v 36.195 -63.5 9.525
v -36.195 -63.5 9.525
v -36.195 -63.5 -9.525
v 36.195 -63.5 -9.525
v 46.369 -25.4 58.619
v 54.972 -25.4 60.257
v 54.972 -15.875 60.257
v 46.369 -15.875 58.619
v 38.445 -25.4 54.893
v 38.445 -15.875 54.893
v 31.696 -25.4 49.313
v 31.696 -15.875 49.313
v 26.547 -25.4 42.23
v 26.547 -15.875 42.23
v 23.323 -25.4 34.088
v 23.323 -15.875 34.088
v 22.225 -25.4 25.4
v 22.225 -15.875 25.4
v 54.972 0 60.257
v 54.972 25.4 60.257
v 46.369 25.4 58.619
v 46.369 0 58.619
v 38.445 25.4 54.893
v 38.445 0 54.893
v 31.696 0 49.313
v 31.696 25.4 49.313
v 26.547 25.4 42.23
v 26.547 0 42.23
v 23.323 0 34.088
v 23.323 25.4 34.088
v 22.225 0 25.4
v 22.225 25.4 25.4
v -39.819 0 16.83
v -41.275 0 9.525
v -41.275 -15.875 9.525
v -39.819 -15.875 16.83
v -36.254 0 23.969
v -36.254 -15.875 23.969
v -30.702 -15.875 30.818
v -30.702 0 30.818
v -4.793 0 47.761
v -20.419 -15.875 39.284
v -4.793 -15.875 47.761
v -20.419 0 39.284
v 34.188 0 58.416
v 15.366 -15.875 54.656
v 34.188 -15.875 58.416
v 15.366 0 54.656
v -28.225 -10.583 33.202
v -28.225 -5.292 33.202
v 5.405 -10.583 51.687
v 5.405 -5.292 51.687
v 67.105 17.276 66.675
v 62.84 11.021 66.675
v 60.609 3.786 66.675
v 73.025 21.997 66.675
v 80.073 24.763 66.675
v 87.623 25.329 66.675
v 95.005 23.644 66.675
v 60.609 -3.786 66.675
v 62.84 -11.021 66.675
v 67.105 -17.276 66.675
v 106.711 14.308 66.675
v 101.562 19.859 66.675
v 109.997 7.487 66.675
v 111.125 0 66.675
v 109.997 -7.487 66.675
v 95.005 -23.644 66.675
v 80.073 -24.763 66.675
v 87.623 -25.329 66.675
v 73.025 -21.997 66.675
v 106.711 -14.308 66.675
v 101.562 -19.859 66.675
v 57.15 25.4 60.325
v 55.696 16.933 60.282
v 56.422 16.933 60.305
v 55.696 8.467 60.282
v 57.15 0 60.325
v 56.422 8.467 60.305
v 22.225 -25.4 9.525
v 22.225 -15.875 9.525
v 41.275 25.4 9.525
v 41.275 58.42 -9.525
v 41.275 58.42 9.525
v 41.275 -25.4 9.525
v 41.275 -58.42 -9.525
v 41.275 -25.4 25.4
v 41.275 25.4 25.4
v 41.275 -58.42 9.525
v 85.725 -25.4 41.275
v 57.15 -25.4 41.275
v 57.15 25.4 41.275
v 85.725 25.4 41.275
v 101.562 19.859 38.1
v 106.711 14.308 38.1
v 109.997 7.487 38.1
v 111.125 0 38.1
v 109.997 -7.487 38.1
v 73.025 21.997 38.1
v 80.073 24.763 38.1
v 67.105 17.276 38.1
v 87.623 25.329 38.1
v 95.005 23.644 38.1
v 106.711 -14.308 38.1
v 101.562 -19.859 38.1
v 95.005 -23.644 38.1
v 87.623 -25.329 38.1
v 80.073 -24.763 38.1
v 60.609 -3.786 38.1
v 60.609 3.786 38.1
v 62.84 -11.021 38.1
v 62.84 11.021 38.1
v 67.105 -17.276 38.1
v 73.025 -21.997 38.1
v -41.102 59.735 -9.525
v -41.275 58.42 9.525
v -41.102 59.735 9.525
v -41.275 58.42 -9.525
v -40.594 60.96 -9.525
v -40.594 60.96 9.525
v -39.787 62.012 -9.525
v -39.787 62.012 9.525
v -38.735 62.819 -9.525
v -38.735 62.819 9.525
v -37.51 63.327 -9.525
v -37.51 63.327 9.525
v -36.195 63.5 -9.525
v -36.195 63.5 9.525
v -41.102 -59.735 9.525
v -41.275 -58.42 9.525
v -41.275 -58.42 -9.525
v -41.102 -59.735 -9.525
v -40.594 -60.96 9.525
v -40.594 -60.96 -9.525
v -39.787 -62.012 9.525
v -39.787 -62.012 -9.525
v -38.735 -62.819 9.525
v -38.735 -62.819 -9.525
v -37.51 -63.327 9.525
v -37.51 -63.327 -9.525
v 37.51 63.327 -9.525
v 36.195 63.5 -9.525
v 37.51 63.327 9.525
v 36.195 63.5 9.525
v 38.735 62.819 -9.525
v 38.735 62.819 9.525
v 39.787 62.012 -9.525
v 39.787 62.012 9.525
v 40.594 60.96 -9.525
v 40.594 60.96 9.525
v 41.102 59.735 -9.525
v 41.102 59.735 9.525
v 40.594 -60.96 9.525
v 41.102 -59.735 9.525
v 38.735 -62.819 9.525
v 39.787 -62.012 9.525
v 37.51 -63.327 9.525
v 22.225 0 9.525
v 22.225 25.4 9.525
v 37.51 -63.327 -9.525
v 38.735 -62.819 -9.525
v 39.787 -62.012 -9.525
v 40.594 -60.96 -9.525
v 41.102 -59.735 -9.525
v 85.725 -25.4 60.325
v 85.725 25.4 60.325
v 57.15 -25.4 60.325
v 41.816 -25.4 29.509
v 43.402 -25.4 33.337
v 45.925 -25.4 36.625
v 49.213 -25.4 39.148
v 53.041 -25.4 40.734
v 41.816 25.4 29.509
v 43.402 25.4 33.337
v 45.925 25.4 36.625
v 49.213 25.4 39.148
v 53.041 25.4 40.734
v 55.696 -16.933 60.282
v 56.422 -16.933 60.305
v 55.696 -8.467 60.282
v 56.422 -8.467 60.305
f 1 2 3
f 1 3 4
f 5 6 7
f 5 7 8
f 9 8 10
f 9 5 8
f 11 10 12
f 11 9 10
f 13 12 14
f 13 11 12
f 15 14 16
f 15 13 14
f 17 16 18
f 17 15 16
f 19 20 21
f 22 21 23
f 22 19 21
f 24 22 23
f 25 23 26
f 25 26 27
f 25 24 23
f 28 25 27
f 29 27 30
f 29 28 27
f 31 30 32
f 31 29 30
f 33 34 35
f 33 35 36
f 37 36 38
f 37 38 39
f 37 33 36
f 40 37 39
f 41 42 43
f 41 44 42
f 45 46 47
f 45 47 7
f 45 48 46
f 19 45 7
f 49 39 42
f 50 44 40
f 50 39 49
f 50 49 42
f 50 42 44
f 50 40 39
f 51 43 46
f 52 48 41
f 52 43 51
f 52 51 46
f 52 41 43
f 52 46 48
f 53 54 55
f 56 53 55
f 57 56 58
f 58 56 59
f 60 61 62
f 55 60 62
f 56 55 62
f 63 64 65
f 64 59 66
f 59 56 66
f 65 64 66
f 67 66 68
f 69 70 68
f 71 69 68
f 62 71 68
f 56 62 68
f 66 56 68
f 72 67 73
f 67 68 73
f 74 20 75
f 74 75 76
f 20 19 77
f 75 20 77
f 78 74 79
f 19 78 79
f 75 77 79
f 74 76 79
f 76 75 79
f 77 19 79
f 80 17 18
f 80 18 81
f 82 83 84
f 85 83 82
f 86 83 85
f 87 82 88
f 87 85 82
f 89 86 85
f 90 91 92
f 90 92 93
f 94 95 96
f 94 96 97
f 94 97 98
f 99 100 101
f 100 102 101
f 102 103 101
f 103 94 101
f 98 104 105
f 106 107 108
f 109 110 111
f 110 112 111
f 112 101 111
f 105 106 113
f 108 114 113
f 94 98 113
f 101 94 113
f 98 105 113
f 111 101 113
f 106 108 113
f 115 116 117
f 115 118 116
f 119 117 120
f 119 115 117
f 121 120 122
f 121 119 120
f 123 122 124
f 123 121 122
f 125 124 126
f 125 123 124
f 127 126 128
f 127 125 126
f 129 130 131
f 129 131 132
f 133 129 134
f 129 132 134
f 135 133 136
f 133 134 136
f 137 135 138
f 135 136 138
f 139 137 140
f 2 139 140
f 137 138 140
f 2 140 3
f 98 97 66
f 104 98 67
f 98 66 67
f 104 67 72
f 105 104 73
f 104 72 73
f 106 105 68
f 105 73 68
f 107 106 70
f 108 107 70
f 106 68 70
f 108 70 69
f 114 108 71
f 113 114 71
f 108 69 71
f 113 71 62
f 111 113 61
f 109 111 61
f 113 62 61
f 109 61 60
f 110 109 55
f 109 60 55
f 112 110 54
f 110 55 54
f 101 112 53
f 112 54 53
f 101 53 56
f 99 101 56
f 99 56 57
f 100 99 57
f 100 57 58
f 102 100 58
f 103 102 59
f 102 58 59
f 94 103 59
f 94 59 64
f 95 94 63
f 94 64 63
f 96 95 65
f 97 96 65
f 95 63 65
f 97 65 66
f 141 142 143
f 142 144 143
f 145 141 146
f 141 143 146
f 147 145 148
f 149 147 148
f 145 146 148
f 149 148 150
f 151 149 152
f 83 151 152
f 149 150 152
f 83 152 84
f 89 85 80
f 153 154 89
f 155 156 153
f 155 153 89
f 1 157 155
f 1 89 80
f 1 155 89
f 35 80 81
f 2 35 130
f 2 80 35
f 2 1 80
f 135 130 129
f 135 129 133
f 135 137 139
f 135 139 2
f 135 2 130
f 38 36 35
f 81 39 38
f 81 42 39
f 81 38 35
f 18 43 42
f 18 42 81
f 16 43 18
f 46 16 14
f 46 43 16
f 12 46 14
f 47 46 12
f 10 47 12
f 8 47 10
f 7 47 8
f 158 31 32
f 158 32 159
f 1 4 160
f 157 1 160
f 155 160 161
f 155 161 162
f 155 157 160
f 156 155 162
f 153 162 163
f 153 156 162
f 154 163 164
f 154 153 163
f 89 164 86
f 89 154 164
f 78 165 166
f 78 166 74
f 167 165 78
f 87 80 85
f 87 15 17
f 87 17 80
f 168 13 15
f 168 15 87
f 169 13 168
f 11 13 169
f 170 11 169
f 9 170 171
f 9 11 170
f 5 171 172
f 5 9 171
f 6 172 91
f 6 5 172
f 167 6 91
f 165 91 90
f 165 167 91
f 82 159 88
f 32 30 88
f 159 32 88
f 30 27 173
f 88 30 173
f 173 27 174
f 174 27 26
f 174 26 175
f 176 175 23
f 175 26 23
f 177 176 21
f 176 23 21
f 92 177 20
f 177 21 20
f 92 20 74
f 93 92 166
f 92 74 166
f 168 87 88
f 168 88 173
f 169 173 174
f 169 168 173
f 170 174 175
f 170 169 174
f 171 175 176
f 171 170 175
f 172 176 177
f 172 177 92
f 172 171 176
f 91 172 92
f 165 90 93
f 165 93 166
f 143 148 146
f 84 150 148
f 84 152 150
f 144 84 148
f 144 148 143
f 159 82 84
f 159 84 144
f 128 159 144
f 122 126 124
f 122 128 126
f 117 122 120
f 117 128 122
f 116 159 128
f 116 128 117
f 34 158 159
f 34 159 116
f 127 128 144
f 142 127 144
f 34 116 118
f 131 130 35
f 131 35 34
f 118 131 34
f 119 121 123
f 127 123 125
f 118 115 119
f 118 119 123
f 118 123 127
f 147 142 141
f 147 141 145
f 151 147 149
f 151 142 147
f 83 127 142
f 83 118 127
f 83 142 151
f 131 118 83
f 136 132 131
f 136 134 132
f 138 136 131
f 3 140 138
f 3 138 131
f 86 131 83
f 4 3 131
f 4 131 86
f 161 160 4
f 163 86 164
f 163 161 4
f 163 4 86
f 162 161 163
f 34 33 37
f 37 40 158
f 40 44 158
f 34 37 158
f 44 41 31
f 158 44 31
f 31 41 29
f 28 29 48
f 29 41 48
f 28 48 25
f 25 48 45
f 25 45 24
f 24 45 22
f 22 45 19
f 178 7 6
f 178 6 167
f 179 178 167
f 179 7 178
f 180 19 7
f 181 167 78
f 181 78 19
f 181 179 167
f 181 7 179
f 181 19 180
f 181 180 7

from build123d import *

# Parameters (mm, degrees)
F1_DEPTH = 63.5
F0_W     = 25.4
F0_H     = 19.05
F2_DEPTH = 25.4
F3_DEPTH = 15.875
F5_R     = 5.08


with BuildPart() as f1:
    # F0 (on Front) → F1 (new body, symmetric)
    with BuildSketch(Plane.XZ):
        Polygon((41.275, -9.525), (41.275, 9.525), (22.225, 9.525), (-41.275, 9.525), (-41.275, -9.525), align=None)
    extrude(amount=F1_DEPTH, both=True)

    # F0 (on Front) → F2 (join, symmetric)
    with BuildSketch(Plane.XZ):
        with BuildLine():
            Line((22.225, 9.525), (41.275, 9.525))
            Line((41.275, 9.525), (41.275, 25.4))
            ThreePointArc((41.275, 25.4), (45.9246798487, 36.6253201513), (57.15, 41.275))
            Line((57.15, 41.275), (60.325, 41.275))
            Line((60.325, 41.275), (60.325, 60.325))
            Line((60.325, 60.325), (57.15, 60.325))
            add(Edge.make_bspline(
                [(54.9717725402, 60.2570071884), (55.6950364998, 60.2833505929), (56.4211273371, 60.3060301334), (57.15, 60.325)],
                knots=[109.3489314382, 109.3489314382, 109.3489314382, 109.3489314382, 110.761548495, 110.761548495, 110.761548495, 110.761548495], degree=3))
            ThreePointArc((54.9717725402, 60.2570071884), (31.6958233385, 49.3131870624), (22.225, 25.4))
            Line((22.225, 25.4), (22.225, 9.525))
        make_face()
        with Locations((73.025, 50.8)):
            Rectangle(F0_W, F0_H)
    extrude(amount=F2_DEPTH, both=True)

    # F0 (on Front) → F3 (join)
    with BuildSketch(Plane.XZ):
        with BuildLine():
            Line((-41.275, 9.525), (22.225, 9.525))
            Line((22.225, 9.525), (22.225, 25.4))
            ThreePointArc((22.225, 25.4), (31.6958233385, 49.3131870624), (54.9717725402, 60.2570071884))
            add(Edge.make_bspline(
                [(-41.275, 9.525), (-40.0631774846, 34.224289081), (-1.0151920435, 58.2177969706), (54.9717725402, 60.2570071884)],
                knots=[0, 0, 0, 0, 109.3489314382, 109.3489314382, 109.3489314382, 109.3489314382], degree=3))
        make_face()
    extrude(amount=F3_DEPTH)

    # F5
    f5_edges = [f1.edges().sort_by_distance(p)[0] for p in [
        (41.275, -63.5, 0),
        (-41.275, -63.5, 0),
        (41.275, 63.5, 0),
        (-41.275, 63.5, 0),
    ]]
    fillet(f5_edges, radius=F5_R)


with BuildPart() as f4:
    # F0 (on Front) → F4 (revolve)
    with BuildSketch(Plane.XZ):
        Polygon((85.725, 60.325), (85.725, 41.275), (85.725, 38.1), (111.125, 38.1), (111.125, 66.675), (85.725, 66.675), align=None)
    revolve(axis=Axis((85.725, 0, 50.8), (0, 0, -1)))


solid = Compound([f1.part, f4.part])
